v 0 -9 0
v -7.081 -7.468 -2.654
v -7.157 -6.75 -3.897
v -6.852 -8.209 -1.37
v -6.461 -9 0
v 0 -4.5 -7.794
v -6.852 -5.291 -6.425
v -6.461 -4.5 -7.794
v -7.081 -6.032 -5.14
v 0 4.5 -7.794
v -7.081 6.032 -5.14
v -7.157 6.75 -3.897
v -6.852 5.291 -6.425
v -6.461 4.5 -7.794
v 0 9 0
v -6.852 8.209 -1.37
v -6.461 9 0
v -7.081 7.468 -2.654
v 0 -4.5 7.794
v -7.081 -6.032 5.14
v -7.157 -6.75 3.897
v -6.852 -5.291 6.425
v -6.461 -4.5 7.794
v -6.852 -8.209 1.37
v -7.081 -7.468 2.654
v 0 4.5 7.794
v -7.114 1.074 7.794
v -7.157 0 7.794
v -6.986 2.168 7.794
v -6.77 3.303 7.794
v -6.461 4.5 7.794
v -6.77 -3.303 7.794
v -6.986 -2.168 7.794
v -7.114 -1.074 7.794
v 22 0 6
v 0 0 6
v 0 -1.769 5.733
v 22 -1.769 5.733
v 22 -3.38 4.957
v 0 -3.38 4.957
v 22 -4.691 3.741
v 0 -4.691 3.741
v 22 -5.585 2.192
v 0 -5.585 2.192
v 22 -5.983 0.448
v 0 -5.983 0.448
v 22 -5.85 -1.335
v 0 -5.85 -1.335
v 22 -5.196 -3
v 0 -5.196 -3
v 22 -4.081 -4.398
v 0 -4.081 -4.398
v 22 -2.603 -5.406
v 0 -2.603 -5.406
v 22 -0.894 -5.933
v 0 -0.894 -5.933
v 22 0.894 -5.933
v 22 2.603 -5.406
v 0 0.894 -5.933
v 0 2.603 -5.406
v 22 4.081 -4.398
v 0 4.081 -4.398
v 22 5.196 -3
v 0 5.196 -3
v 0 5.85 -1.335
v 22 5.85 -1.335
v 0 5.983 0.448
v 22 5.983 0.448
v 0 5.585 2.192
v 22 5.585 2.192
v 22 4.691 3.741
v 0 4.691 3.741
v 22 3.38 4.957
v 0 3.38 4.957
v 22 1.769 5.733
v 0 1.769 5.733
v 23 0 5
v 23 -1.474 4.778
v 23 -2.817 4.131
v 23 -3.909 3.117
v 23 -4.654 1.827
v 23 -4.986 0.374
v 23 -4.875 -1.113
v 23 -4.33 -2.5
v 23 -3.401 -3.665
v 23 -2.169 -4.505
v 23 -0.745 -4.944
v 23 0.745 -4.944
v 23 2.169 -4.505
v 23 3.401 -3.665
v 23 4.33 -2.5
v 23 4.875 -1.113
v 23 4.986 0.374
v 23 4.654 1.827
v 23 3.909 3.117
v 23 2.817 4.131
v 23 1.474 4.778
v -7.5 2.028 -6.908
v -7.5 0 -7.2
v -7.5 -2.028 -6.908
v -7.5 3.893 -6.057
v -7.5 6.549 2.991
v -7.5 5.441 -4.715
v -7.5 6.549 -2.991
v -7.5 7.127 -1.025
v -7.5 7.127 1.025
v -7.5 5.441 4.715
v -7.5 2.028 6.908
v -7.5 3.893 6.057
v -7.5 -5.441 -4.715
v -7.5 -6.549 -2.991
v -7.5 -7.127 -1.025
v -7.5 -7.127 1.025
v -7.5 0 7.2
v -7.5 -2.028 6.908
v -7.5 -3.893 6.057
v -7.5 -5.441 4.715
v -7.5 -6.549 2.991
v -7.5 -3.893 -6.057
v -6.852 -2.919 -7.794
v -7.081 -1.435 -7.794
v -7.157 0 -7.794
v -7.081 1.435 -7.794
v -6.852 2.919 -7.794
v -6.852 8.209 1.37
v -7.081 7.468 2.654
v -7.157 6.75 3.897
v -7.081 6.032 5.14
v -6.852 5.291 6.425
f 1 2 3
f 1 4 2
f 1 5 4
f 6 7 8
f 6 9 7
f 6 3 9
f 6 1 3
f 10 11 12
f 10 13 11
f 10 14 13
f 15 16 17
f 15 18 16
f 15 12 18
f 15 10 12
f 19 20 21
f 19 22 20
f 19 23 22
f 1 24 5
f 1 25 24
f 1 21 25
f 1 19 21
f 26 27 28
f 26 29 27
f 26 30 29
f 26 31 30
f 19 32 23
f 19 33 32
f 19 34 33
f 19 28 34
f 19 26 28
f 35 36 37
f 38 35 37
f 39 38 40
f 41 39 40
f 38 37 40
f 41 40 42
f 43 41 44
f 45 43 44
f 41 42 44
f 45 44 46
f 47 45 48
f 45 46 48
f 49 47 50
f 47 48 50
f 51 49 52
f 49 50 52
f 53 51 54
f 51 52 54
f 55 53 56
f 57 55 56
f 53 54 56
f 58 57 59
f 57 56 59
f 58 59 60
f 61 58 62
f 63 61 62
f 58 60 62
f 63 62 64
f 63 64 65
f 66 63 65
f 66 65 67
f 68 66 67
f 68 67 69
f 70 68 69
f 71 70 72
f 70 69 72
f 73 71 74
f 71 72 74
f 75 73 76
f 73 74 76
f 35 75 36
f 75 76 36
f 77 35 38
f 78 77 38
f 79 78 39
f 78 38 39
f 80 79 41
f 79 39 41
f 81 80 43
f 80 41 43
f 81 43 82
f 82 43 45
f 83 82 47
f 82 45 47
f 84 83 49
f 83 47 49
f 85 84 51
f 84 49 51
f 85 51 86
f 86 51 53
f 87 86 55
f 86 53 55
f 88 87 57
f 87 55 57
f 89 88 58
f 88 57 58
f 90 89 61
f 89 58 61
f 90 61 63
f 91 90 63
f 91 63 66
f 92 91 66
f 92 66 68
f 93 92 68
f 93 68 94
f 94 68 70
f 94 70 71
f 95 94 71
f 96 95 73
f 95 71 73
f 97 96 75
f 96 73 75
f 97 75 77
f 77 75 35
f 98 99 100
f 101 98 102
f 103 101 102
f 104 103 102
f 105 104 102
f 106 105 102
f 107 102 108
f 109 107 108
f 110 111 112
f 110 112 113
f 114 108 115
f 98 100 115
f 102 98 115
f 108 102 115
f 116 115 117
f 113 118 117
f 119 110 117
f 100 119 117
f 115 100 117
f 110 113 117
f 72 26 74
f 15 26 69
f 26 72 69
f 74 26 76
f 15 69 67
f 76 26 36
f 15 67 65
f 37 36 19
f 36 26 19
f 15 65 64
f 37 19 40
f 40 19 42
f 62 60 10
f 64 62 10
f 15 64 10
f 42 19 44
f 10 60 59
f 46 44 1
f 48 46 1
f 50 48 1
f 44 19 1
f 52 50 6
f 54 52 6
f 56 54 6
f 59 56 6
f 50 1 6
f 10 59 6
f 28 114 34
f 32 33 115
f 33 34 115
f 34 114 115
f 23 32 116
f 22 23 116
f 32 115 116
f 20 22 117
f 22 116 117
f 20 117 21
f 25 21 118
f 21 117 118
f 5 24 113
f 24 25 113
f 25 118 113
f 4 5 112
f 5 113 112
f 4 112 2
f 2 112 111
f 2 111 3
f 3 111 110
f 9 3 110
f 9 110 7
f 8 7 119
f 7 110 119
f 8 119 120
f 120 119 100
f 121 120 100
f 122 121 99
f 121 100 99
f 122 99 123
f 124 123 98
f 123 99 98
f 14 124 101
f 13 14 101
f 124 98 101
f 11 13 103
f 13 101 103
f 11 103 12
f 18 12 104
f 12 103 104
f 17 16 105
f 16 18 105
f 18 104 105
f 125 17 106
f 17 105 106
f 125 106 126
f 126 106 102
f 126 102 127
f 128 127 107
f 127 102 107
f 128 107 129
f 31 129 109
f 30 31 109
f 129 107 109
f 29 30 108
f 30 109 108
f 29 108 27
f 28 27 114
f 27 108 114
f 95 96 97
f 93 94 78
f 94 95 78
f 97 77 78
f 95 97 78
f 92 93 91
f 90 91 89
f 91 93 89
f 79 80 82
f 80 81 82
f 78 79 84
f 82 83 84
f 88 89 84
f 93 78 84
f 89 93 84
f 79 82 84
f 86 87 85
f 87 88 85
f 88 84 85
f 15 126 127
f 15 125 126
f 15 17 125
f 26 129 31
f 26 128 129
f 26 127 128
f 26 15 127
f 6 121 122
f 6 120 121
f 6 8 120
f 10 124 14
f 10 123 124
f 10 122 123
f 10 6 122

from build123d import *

# Parameters (mm, degrees)
SKETCH_2_OUTSIDE_W  = 27.946
SKETCH_2_OUTSIDE_H  = 27.946
CUT_EXTRUDE_1_DEPTH = 10
CHAMFER_1_SIZE      = 1


with BuildPart() as part:
    # Эскиз1 → Повернуть1 (revolve)
    with BuildSketch(Plane.XY, mode=Mode.PRIVATE) as revolve_1_sk:
        Polygon((0, 0), (23, 0), (23, 6), (0, 6), (0, 9), (-6.460769515, 9), (-7.5, 7.2), (-7.5, 0), align=None)
    revolve(revolve_1_sk.sketch.rotate(Axis((0, 0, 0), (1, 0, 0)), 90), axis=Axis((0, 0, 0), (1, 0, 0)))

    # Эскиз2 outside → Вырез-Вытянуть1 (cut)
    with BuildSketch(Plane(origin=(0, 0, 0), x_dir=(0, 0, -1), z_dir=(1, 0, 0))):
        Rectangle(SKETCH_2_OUTSIDE_W, SKETCH_2_OUTSIDE_H)
        Polygon((7.794228634, 4.5), (0, 9), (-7.794228634, 4.5), (-7.794228634, -4.5), (0, -9), (7.794228634, -4.5), align=None, mode=Mode.SUBTRACT)
    extrude(amount=-CUT_EXTRUDE_1_DEPTH, mode=Mode.SUBTRACT)

    # Фаска1
    chamfer_1_edges = [part.edges().sort_by_distance(p)[0] for p in [
        (23, 0, -6),
    ]]
    chamfer(chamfer_1_edges, length=CHAMFER_1_SIZE)


solid = part.part
